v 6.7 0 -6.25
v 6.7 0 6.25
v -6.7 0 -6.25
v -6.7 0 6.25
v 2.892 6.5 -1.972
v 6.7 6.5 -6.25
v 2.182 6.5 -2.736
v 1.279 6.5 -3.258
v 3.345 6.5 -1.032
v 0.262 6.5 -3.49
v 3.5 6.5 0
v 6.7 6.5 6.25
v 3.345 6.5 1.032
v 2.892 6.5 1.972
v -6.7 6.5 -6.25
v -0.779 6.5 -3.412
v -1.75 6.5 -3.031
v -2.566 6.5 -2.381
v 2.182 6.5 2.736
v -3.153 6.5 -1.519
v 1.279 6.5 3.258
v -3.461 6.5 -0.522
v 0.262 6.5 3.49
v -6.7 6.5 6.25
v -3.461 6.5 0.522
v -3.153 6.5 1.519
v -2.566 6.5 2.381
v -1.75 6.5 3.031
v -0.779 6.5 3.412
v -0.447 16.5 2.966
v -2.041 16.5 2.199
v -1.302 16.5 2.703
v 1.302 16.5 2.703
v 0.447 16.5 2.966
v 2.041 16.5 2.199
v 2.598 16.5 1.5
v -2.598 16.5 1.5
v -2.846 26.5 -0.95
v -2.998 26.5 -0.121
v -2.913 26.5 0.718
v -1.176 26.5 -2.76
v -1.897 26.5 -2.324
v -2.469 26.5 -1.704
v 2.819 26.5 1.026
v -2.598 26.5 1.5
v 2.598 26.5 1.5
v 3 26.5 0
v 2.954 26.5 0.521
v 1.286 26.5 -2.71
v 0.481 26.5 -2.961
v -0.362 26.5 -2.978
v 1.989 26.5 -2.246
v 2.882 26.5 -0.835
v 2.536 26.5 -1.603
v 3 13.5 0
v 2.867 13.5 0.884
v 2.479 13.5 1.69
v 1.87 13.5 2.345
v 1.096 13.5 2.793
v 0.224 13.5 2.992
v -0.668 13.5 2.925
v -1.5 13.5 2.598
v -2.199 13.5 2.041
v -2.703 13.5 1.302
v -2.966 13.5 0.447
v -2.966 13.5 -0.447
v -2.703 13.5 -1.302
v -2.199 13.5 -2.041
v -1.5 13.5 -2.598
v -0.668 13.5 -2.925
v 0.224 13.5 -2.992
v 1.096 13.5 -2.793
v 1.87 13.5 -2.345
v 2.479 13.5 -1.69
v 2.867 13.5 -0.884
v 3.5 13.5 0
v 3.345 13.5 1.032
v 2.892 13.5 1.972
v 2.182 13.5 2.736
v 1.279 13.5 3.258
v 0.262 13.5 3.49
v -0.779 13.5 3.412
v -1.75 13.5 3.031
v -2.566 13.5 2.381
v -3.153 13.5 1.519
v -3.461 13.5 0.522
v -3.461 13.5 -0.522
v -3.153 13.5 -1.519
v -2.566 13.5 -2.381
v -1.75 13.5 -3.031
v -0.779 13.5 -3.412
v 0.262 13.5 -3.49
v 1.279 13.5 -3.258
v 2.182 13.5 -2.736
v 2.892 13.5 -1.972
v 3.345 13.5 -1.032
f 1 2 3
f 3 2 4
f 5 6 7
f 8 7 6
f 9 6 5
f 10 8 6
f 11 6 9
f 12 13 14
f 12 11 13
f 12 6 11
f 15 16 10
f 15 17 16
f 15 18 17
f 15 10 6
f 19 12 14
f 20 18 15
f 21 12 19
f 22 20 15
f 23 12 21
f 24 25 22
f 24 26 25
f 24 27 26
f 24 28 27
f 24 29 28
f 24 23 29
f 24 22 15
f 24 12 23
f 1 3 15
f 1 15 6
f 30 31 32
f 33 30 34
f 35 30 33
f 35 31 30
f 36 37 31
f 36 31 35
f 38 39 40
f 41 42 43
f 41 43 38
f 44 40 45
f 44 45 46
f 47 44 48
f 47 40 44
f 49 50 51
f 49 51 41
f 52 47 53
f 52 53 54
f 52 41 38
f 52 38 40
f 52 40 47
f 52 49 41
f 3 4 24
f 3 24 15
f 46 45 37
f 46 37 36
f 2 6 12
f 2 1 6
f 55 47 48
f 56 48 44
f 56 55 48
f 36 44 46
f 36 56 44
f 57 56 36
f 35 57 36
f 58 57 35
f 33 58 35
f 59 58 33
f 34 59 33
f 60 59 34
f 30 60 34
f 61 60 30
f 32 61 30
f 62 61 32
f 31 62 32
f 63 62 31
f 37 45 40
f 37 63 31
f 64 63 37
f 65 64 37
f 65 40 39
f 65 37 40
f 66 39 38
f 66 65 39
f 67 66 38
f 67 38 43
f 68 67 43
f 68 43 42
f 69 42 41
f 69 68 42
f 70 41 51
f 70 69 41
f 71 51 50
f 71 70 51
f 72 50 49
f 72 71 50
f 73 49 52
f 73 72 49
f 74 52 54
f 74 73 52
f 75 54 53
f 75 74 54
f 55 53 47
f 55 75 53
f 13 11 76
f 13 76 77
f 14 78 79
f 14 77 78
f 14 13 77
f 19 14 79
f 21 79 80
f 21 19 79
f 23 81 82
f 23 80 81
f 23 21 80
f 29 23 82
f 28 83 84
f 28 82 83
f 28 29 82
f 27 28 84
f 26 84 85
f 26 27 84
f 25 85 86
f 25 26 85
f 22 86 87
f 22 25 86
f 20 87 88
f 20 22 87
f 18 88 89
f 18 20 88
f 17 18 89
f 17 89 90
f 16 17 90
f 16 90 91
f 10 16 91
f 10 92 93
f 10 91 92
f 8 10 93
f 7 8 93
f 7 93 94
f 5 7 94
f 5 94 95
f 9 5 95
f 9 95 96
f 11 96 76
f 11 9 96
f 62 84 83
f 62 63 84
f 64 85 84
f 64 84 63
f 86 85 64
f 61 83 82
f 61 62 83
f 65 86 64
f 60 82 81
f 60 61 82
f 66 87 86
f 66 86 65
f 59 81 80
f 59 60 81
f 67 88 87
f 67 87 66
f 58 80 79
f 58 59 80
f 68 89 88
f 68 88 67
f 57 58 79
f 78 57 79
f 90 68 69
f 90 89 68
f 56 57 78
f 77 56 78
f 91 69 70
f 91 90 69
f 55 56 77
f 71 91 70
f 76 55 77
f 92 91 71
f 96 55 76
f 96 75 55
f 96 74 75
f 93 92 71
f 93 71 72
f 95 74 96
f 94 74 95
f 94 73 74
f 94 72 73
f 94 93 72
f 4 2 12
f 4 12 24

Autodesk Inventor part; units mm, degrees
ref_plane "YZ Plane" through (0, 0, 0) normal (1, 0, 0) x (0, 1, 0)
ref_plane "XZ Plane" through (0, 0, 0) normal (0, 1, 0) x (-1, 0, 0)
ref_plane "XY Plane" through (0, 0, 0) normal (0, 0, 1) x (1, 0, 0)
sketch "Sketch1" plane through (0, 0, 0) normal (0, 1, 0) x (-1, 0, 0)
  line L0 (-6.7, 6.25) -> (6.7, 6.25)
  line L1 (6.7, 6.25) -> (6.7, -6.25)
  line L2 (6.7, -6.25) -> (-6.7, -6.25)
  line L3 (-6.7, -6.25) -> (-6.7, 6.25)
  line L4 (-6.7, 6.25) -> (6.7, -6.25) construction
  line L5 (6.7, 6.25) -> (-6.7, -6.25) construction
  point P0 (0, 0)
  dimension "d0" = 13.4
  dimension "d1" = 12.5
extrude "Extrusion1" add sketch "Sketch1" along normal blind 6.5
sketch "Sketch2" plane through (0, 6.5, 0) normal (0, 1, 0) x (1, 0, 0)
  circle A0 centre (0, 0) radius 3.5
  dimension "d4" = 7
extrude "Extrusion2" add sketch "Sketch2" along normal blind 7
sketch "Sketch3" plane through (0, 13.5, 0) normal (0, 1, 0) x (1, 0, 0)
  circle A0 centre (0, 0) radius 3
  dimension "d7" = 6
extrude "Extrusion3" add sketch "Sketch3" along normal blind 13
sketch "Sketch4" plane through (0, 26.5, 0) normal (0, 1, 0) x (1, 0, 0)
  line L0 (0, -1.5) -> (2.5981, -1.5)
  circle A0 centre (0, 0) radius 3 projected
  line L1 (0, -1.5) -> (-2.5981, -1.5)
  arc A1 (-2.5981, -1.5) -> (2.5981, -1.5) centre (0, 0) ccw
  dimension "d10" = 1.5
extrude "Extrusion4" cut sketch "Sketch4" against normal blind 10 contours L0 A0 L1 picked at (-1.5934, -1.6862)
thread "Thread1" size "M7x1" class "6g" standard "ISO Metric profile" full length
properties part number "PEC11R-4215F-S0024"
